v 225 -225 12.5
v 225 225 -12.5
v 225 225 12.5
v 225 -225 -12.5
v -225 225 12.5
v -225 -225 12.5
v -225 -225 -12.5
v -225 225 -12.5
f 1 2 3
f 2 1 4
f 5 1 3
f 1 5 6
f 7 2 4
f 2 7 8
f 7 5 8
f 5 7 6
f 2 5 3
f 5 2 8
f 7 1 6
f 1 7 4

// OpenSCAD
ledSpacing = 33.3; // Spacing between LEDs
cols = 11;
rows = 10;
sideLength = 380; // Length of the side of the square plate non-front plate layers.
assert(ledSpacing * cols <= sideLength);


module FrontPlate(fontSize = 20, sideLength = 450, spacing = 10, margin = 50) {
    plateThickness = 2; // Thickness of the glass plate

    // Create the base plate
    difference() {
        cube([sideLength, sideLength, plateThickness], center = true);

        // Define the text layout
        textLines = [  // 11 cols, 10 rows
            "ESKISTAFÜNF",
            "ZEHNZWANZIG",
            "DREIVIERTEL",
            "VORFUNKNACH",
            "HALBAELFÜNF",
            "EINSXAMZWEI",
            "DREIPMJVIER",
            "SECHSNLACHT",
            "SIEBENZWÖLF",
            "ZEHNEUNKUHR"
        ];


        // Calculate total text grid dimensions
        textWidth = len(textLines[0]) * (fontSize + spacing) - spacing;
        textHeight = len(textLines) * (fontSize + spacing) - spacing;

        // Generate text cutouts
        for (row = [0 : len(textLines) - 1]) {
            for (col = [0 : len(textLines[row]) - 1]) {
                translate([
                    -textWidth / 2 + col * (fontSize + spacing),
                    textHeight / 2 - row * (fontSize + spacing),
                    0
                ])
                linear_extrude(height = plateThickness)
                    text(
                        textLines[row][col],
                        size = fontSize,
                        valign = "center",
                        halign = "center",
                        font= "Wordclock Stencil Mono"
                    );
            }
        }
    }
}


// Call the module to render the front plate
// FrontPlate();

module Diffuser(diffuserThickness = 5, diffuserLength = 370, diffuserWidth = 370) {
    cube([diffuserLength, diffuserWidth, diffuserThickness], center = true);
}

module Separator(separatorThickness = 25, separatorLength = 450) {
    cube([separatorLength, separatorLength, separatorThickness], center = true);

    // Define the number of rows and columns for the holes
    rows = 10;
    cols = 11;

    // Calculate spacing between holes
    holeSpacingX = separatorLength / cols;
    holeSpacingY = separatorLength / rows;

    // Define hole radius
    holeRadius = 5;

    // Create the cylindrical holes
    for (row = [0 : rows - 1]) {
        for (col = [0 : cols - 1]) {
            translate([
                -separatorLength / 2 + (col + 0.5) * holeSpacingX,
                -separatorLength / 2 + (row + 0.5) * holeSpacingY,
                0
            ])
            rotate([90, 0, 0])
                cylinder(h = separatorThickness, r = holeRadius, center = true);
        }
    }
}

Separator();
